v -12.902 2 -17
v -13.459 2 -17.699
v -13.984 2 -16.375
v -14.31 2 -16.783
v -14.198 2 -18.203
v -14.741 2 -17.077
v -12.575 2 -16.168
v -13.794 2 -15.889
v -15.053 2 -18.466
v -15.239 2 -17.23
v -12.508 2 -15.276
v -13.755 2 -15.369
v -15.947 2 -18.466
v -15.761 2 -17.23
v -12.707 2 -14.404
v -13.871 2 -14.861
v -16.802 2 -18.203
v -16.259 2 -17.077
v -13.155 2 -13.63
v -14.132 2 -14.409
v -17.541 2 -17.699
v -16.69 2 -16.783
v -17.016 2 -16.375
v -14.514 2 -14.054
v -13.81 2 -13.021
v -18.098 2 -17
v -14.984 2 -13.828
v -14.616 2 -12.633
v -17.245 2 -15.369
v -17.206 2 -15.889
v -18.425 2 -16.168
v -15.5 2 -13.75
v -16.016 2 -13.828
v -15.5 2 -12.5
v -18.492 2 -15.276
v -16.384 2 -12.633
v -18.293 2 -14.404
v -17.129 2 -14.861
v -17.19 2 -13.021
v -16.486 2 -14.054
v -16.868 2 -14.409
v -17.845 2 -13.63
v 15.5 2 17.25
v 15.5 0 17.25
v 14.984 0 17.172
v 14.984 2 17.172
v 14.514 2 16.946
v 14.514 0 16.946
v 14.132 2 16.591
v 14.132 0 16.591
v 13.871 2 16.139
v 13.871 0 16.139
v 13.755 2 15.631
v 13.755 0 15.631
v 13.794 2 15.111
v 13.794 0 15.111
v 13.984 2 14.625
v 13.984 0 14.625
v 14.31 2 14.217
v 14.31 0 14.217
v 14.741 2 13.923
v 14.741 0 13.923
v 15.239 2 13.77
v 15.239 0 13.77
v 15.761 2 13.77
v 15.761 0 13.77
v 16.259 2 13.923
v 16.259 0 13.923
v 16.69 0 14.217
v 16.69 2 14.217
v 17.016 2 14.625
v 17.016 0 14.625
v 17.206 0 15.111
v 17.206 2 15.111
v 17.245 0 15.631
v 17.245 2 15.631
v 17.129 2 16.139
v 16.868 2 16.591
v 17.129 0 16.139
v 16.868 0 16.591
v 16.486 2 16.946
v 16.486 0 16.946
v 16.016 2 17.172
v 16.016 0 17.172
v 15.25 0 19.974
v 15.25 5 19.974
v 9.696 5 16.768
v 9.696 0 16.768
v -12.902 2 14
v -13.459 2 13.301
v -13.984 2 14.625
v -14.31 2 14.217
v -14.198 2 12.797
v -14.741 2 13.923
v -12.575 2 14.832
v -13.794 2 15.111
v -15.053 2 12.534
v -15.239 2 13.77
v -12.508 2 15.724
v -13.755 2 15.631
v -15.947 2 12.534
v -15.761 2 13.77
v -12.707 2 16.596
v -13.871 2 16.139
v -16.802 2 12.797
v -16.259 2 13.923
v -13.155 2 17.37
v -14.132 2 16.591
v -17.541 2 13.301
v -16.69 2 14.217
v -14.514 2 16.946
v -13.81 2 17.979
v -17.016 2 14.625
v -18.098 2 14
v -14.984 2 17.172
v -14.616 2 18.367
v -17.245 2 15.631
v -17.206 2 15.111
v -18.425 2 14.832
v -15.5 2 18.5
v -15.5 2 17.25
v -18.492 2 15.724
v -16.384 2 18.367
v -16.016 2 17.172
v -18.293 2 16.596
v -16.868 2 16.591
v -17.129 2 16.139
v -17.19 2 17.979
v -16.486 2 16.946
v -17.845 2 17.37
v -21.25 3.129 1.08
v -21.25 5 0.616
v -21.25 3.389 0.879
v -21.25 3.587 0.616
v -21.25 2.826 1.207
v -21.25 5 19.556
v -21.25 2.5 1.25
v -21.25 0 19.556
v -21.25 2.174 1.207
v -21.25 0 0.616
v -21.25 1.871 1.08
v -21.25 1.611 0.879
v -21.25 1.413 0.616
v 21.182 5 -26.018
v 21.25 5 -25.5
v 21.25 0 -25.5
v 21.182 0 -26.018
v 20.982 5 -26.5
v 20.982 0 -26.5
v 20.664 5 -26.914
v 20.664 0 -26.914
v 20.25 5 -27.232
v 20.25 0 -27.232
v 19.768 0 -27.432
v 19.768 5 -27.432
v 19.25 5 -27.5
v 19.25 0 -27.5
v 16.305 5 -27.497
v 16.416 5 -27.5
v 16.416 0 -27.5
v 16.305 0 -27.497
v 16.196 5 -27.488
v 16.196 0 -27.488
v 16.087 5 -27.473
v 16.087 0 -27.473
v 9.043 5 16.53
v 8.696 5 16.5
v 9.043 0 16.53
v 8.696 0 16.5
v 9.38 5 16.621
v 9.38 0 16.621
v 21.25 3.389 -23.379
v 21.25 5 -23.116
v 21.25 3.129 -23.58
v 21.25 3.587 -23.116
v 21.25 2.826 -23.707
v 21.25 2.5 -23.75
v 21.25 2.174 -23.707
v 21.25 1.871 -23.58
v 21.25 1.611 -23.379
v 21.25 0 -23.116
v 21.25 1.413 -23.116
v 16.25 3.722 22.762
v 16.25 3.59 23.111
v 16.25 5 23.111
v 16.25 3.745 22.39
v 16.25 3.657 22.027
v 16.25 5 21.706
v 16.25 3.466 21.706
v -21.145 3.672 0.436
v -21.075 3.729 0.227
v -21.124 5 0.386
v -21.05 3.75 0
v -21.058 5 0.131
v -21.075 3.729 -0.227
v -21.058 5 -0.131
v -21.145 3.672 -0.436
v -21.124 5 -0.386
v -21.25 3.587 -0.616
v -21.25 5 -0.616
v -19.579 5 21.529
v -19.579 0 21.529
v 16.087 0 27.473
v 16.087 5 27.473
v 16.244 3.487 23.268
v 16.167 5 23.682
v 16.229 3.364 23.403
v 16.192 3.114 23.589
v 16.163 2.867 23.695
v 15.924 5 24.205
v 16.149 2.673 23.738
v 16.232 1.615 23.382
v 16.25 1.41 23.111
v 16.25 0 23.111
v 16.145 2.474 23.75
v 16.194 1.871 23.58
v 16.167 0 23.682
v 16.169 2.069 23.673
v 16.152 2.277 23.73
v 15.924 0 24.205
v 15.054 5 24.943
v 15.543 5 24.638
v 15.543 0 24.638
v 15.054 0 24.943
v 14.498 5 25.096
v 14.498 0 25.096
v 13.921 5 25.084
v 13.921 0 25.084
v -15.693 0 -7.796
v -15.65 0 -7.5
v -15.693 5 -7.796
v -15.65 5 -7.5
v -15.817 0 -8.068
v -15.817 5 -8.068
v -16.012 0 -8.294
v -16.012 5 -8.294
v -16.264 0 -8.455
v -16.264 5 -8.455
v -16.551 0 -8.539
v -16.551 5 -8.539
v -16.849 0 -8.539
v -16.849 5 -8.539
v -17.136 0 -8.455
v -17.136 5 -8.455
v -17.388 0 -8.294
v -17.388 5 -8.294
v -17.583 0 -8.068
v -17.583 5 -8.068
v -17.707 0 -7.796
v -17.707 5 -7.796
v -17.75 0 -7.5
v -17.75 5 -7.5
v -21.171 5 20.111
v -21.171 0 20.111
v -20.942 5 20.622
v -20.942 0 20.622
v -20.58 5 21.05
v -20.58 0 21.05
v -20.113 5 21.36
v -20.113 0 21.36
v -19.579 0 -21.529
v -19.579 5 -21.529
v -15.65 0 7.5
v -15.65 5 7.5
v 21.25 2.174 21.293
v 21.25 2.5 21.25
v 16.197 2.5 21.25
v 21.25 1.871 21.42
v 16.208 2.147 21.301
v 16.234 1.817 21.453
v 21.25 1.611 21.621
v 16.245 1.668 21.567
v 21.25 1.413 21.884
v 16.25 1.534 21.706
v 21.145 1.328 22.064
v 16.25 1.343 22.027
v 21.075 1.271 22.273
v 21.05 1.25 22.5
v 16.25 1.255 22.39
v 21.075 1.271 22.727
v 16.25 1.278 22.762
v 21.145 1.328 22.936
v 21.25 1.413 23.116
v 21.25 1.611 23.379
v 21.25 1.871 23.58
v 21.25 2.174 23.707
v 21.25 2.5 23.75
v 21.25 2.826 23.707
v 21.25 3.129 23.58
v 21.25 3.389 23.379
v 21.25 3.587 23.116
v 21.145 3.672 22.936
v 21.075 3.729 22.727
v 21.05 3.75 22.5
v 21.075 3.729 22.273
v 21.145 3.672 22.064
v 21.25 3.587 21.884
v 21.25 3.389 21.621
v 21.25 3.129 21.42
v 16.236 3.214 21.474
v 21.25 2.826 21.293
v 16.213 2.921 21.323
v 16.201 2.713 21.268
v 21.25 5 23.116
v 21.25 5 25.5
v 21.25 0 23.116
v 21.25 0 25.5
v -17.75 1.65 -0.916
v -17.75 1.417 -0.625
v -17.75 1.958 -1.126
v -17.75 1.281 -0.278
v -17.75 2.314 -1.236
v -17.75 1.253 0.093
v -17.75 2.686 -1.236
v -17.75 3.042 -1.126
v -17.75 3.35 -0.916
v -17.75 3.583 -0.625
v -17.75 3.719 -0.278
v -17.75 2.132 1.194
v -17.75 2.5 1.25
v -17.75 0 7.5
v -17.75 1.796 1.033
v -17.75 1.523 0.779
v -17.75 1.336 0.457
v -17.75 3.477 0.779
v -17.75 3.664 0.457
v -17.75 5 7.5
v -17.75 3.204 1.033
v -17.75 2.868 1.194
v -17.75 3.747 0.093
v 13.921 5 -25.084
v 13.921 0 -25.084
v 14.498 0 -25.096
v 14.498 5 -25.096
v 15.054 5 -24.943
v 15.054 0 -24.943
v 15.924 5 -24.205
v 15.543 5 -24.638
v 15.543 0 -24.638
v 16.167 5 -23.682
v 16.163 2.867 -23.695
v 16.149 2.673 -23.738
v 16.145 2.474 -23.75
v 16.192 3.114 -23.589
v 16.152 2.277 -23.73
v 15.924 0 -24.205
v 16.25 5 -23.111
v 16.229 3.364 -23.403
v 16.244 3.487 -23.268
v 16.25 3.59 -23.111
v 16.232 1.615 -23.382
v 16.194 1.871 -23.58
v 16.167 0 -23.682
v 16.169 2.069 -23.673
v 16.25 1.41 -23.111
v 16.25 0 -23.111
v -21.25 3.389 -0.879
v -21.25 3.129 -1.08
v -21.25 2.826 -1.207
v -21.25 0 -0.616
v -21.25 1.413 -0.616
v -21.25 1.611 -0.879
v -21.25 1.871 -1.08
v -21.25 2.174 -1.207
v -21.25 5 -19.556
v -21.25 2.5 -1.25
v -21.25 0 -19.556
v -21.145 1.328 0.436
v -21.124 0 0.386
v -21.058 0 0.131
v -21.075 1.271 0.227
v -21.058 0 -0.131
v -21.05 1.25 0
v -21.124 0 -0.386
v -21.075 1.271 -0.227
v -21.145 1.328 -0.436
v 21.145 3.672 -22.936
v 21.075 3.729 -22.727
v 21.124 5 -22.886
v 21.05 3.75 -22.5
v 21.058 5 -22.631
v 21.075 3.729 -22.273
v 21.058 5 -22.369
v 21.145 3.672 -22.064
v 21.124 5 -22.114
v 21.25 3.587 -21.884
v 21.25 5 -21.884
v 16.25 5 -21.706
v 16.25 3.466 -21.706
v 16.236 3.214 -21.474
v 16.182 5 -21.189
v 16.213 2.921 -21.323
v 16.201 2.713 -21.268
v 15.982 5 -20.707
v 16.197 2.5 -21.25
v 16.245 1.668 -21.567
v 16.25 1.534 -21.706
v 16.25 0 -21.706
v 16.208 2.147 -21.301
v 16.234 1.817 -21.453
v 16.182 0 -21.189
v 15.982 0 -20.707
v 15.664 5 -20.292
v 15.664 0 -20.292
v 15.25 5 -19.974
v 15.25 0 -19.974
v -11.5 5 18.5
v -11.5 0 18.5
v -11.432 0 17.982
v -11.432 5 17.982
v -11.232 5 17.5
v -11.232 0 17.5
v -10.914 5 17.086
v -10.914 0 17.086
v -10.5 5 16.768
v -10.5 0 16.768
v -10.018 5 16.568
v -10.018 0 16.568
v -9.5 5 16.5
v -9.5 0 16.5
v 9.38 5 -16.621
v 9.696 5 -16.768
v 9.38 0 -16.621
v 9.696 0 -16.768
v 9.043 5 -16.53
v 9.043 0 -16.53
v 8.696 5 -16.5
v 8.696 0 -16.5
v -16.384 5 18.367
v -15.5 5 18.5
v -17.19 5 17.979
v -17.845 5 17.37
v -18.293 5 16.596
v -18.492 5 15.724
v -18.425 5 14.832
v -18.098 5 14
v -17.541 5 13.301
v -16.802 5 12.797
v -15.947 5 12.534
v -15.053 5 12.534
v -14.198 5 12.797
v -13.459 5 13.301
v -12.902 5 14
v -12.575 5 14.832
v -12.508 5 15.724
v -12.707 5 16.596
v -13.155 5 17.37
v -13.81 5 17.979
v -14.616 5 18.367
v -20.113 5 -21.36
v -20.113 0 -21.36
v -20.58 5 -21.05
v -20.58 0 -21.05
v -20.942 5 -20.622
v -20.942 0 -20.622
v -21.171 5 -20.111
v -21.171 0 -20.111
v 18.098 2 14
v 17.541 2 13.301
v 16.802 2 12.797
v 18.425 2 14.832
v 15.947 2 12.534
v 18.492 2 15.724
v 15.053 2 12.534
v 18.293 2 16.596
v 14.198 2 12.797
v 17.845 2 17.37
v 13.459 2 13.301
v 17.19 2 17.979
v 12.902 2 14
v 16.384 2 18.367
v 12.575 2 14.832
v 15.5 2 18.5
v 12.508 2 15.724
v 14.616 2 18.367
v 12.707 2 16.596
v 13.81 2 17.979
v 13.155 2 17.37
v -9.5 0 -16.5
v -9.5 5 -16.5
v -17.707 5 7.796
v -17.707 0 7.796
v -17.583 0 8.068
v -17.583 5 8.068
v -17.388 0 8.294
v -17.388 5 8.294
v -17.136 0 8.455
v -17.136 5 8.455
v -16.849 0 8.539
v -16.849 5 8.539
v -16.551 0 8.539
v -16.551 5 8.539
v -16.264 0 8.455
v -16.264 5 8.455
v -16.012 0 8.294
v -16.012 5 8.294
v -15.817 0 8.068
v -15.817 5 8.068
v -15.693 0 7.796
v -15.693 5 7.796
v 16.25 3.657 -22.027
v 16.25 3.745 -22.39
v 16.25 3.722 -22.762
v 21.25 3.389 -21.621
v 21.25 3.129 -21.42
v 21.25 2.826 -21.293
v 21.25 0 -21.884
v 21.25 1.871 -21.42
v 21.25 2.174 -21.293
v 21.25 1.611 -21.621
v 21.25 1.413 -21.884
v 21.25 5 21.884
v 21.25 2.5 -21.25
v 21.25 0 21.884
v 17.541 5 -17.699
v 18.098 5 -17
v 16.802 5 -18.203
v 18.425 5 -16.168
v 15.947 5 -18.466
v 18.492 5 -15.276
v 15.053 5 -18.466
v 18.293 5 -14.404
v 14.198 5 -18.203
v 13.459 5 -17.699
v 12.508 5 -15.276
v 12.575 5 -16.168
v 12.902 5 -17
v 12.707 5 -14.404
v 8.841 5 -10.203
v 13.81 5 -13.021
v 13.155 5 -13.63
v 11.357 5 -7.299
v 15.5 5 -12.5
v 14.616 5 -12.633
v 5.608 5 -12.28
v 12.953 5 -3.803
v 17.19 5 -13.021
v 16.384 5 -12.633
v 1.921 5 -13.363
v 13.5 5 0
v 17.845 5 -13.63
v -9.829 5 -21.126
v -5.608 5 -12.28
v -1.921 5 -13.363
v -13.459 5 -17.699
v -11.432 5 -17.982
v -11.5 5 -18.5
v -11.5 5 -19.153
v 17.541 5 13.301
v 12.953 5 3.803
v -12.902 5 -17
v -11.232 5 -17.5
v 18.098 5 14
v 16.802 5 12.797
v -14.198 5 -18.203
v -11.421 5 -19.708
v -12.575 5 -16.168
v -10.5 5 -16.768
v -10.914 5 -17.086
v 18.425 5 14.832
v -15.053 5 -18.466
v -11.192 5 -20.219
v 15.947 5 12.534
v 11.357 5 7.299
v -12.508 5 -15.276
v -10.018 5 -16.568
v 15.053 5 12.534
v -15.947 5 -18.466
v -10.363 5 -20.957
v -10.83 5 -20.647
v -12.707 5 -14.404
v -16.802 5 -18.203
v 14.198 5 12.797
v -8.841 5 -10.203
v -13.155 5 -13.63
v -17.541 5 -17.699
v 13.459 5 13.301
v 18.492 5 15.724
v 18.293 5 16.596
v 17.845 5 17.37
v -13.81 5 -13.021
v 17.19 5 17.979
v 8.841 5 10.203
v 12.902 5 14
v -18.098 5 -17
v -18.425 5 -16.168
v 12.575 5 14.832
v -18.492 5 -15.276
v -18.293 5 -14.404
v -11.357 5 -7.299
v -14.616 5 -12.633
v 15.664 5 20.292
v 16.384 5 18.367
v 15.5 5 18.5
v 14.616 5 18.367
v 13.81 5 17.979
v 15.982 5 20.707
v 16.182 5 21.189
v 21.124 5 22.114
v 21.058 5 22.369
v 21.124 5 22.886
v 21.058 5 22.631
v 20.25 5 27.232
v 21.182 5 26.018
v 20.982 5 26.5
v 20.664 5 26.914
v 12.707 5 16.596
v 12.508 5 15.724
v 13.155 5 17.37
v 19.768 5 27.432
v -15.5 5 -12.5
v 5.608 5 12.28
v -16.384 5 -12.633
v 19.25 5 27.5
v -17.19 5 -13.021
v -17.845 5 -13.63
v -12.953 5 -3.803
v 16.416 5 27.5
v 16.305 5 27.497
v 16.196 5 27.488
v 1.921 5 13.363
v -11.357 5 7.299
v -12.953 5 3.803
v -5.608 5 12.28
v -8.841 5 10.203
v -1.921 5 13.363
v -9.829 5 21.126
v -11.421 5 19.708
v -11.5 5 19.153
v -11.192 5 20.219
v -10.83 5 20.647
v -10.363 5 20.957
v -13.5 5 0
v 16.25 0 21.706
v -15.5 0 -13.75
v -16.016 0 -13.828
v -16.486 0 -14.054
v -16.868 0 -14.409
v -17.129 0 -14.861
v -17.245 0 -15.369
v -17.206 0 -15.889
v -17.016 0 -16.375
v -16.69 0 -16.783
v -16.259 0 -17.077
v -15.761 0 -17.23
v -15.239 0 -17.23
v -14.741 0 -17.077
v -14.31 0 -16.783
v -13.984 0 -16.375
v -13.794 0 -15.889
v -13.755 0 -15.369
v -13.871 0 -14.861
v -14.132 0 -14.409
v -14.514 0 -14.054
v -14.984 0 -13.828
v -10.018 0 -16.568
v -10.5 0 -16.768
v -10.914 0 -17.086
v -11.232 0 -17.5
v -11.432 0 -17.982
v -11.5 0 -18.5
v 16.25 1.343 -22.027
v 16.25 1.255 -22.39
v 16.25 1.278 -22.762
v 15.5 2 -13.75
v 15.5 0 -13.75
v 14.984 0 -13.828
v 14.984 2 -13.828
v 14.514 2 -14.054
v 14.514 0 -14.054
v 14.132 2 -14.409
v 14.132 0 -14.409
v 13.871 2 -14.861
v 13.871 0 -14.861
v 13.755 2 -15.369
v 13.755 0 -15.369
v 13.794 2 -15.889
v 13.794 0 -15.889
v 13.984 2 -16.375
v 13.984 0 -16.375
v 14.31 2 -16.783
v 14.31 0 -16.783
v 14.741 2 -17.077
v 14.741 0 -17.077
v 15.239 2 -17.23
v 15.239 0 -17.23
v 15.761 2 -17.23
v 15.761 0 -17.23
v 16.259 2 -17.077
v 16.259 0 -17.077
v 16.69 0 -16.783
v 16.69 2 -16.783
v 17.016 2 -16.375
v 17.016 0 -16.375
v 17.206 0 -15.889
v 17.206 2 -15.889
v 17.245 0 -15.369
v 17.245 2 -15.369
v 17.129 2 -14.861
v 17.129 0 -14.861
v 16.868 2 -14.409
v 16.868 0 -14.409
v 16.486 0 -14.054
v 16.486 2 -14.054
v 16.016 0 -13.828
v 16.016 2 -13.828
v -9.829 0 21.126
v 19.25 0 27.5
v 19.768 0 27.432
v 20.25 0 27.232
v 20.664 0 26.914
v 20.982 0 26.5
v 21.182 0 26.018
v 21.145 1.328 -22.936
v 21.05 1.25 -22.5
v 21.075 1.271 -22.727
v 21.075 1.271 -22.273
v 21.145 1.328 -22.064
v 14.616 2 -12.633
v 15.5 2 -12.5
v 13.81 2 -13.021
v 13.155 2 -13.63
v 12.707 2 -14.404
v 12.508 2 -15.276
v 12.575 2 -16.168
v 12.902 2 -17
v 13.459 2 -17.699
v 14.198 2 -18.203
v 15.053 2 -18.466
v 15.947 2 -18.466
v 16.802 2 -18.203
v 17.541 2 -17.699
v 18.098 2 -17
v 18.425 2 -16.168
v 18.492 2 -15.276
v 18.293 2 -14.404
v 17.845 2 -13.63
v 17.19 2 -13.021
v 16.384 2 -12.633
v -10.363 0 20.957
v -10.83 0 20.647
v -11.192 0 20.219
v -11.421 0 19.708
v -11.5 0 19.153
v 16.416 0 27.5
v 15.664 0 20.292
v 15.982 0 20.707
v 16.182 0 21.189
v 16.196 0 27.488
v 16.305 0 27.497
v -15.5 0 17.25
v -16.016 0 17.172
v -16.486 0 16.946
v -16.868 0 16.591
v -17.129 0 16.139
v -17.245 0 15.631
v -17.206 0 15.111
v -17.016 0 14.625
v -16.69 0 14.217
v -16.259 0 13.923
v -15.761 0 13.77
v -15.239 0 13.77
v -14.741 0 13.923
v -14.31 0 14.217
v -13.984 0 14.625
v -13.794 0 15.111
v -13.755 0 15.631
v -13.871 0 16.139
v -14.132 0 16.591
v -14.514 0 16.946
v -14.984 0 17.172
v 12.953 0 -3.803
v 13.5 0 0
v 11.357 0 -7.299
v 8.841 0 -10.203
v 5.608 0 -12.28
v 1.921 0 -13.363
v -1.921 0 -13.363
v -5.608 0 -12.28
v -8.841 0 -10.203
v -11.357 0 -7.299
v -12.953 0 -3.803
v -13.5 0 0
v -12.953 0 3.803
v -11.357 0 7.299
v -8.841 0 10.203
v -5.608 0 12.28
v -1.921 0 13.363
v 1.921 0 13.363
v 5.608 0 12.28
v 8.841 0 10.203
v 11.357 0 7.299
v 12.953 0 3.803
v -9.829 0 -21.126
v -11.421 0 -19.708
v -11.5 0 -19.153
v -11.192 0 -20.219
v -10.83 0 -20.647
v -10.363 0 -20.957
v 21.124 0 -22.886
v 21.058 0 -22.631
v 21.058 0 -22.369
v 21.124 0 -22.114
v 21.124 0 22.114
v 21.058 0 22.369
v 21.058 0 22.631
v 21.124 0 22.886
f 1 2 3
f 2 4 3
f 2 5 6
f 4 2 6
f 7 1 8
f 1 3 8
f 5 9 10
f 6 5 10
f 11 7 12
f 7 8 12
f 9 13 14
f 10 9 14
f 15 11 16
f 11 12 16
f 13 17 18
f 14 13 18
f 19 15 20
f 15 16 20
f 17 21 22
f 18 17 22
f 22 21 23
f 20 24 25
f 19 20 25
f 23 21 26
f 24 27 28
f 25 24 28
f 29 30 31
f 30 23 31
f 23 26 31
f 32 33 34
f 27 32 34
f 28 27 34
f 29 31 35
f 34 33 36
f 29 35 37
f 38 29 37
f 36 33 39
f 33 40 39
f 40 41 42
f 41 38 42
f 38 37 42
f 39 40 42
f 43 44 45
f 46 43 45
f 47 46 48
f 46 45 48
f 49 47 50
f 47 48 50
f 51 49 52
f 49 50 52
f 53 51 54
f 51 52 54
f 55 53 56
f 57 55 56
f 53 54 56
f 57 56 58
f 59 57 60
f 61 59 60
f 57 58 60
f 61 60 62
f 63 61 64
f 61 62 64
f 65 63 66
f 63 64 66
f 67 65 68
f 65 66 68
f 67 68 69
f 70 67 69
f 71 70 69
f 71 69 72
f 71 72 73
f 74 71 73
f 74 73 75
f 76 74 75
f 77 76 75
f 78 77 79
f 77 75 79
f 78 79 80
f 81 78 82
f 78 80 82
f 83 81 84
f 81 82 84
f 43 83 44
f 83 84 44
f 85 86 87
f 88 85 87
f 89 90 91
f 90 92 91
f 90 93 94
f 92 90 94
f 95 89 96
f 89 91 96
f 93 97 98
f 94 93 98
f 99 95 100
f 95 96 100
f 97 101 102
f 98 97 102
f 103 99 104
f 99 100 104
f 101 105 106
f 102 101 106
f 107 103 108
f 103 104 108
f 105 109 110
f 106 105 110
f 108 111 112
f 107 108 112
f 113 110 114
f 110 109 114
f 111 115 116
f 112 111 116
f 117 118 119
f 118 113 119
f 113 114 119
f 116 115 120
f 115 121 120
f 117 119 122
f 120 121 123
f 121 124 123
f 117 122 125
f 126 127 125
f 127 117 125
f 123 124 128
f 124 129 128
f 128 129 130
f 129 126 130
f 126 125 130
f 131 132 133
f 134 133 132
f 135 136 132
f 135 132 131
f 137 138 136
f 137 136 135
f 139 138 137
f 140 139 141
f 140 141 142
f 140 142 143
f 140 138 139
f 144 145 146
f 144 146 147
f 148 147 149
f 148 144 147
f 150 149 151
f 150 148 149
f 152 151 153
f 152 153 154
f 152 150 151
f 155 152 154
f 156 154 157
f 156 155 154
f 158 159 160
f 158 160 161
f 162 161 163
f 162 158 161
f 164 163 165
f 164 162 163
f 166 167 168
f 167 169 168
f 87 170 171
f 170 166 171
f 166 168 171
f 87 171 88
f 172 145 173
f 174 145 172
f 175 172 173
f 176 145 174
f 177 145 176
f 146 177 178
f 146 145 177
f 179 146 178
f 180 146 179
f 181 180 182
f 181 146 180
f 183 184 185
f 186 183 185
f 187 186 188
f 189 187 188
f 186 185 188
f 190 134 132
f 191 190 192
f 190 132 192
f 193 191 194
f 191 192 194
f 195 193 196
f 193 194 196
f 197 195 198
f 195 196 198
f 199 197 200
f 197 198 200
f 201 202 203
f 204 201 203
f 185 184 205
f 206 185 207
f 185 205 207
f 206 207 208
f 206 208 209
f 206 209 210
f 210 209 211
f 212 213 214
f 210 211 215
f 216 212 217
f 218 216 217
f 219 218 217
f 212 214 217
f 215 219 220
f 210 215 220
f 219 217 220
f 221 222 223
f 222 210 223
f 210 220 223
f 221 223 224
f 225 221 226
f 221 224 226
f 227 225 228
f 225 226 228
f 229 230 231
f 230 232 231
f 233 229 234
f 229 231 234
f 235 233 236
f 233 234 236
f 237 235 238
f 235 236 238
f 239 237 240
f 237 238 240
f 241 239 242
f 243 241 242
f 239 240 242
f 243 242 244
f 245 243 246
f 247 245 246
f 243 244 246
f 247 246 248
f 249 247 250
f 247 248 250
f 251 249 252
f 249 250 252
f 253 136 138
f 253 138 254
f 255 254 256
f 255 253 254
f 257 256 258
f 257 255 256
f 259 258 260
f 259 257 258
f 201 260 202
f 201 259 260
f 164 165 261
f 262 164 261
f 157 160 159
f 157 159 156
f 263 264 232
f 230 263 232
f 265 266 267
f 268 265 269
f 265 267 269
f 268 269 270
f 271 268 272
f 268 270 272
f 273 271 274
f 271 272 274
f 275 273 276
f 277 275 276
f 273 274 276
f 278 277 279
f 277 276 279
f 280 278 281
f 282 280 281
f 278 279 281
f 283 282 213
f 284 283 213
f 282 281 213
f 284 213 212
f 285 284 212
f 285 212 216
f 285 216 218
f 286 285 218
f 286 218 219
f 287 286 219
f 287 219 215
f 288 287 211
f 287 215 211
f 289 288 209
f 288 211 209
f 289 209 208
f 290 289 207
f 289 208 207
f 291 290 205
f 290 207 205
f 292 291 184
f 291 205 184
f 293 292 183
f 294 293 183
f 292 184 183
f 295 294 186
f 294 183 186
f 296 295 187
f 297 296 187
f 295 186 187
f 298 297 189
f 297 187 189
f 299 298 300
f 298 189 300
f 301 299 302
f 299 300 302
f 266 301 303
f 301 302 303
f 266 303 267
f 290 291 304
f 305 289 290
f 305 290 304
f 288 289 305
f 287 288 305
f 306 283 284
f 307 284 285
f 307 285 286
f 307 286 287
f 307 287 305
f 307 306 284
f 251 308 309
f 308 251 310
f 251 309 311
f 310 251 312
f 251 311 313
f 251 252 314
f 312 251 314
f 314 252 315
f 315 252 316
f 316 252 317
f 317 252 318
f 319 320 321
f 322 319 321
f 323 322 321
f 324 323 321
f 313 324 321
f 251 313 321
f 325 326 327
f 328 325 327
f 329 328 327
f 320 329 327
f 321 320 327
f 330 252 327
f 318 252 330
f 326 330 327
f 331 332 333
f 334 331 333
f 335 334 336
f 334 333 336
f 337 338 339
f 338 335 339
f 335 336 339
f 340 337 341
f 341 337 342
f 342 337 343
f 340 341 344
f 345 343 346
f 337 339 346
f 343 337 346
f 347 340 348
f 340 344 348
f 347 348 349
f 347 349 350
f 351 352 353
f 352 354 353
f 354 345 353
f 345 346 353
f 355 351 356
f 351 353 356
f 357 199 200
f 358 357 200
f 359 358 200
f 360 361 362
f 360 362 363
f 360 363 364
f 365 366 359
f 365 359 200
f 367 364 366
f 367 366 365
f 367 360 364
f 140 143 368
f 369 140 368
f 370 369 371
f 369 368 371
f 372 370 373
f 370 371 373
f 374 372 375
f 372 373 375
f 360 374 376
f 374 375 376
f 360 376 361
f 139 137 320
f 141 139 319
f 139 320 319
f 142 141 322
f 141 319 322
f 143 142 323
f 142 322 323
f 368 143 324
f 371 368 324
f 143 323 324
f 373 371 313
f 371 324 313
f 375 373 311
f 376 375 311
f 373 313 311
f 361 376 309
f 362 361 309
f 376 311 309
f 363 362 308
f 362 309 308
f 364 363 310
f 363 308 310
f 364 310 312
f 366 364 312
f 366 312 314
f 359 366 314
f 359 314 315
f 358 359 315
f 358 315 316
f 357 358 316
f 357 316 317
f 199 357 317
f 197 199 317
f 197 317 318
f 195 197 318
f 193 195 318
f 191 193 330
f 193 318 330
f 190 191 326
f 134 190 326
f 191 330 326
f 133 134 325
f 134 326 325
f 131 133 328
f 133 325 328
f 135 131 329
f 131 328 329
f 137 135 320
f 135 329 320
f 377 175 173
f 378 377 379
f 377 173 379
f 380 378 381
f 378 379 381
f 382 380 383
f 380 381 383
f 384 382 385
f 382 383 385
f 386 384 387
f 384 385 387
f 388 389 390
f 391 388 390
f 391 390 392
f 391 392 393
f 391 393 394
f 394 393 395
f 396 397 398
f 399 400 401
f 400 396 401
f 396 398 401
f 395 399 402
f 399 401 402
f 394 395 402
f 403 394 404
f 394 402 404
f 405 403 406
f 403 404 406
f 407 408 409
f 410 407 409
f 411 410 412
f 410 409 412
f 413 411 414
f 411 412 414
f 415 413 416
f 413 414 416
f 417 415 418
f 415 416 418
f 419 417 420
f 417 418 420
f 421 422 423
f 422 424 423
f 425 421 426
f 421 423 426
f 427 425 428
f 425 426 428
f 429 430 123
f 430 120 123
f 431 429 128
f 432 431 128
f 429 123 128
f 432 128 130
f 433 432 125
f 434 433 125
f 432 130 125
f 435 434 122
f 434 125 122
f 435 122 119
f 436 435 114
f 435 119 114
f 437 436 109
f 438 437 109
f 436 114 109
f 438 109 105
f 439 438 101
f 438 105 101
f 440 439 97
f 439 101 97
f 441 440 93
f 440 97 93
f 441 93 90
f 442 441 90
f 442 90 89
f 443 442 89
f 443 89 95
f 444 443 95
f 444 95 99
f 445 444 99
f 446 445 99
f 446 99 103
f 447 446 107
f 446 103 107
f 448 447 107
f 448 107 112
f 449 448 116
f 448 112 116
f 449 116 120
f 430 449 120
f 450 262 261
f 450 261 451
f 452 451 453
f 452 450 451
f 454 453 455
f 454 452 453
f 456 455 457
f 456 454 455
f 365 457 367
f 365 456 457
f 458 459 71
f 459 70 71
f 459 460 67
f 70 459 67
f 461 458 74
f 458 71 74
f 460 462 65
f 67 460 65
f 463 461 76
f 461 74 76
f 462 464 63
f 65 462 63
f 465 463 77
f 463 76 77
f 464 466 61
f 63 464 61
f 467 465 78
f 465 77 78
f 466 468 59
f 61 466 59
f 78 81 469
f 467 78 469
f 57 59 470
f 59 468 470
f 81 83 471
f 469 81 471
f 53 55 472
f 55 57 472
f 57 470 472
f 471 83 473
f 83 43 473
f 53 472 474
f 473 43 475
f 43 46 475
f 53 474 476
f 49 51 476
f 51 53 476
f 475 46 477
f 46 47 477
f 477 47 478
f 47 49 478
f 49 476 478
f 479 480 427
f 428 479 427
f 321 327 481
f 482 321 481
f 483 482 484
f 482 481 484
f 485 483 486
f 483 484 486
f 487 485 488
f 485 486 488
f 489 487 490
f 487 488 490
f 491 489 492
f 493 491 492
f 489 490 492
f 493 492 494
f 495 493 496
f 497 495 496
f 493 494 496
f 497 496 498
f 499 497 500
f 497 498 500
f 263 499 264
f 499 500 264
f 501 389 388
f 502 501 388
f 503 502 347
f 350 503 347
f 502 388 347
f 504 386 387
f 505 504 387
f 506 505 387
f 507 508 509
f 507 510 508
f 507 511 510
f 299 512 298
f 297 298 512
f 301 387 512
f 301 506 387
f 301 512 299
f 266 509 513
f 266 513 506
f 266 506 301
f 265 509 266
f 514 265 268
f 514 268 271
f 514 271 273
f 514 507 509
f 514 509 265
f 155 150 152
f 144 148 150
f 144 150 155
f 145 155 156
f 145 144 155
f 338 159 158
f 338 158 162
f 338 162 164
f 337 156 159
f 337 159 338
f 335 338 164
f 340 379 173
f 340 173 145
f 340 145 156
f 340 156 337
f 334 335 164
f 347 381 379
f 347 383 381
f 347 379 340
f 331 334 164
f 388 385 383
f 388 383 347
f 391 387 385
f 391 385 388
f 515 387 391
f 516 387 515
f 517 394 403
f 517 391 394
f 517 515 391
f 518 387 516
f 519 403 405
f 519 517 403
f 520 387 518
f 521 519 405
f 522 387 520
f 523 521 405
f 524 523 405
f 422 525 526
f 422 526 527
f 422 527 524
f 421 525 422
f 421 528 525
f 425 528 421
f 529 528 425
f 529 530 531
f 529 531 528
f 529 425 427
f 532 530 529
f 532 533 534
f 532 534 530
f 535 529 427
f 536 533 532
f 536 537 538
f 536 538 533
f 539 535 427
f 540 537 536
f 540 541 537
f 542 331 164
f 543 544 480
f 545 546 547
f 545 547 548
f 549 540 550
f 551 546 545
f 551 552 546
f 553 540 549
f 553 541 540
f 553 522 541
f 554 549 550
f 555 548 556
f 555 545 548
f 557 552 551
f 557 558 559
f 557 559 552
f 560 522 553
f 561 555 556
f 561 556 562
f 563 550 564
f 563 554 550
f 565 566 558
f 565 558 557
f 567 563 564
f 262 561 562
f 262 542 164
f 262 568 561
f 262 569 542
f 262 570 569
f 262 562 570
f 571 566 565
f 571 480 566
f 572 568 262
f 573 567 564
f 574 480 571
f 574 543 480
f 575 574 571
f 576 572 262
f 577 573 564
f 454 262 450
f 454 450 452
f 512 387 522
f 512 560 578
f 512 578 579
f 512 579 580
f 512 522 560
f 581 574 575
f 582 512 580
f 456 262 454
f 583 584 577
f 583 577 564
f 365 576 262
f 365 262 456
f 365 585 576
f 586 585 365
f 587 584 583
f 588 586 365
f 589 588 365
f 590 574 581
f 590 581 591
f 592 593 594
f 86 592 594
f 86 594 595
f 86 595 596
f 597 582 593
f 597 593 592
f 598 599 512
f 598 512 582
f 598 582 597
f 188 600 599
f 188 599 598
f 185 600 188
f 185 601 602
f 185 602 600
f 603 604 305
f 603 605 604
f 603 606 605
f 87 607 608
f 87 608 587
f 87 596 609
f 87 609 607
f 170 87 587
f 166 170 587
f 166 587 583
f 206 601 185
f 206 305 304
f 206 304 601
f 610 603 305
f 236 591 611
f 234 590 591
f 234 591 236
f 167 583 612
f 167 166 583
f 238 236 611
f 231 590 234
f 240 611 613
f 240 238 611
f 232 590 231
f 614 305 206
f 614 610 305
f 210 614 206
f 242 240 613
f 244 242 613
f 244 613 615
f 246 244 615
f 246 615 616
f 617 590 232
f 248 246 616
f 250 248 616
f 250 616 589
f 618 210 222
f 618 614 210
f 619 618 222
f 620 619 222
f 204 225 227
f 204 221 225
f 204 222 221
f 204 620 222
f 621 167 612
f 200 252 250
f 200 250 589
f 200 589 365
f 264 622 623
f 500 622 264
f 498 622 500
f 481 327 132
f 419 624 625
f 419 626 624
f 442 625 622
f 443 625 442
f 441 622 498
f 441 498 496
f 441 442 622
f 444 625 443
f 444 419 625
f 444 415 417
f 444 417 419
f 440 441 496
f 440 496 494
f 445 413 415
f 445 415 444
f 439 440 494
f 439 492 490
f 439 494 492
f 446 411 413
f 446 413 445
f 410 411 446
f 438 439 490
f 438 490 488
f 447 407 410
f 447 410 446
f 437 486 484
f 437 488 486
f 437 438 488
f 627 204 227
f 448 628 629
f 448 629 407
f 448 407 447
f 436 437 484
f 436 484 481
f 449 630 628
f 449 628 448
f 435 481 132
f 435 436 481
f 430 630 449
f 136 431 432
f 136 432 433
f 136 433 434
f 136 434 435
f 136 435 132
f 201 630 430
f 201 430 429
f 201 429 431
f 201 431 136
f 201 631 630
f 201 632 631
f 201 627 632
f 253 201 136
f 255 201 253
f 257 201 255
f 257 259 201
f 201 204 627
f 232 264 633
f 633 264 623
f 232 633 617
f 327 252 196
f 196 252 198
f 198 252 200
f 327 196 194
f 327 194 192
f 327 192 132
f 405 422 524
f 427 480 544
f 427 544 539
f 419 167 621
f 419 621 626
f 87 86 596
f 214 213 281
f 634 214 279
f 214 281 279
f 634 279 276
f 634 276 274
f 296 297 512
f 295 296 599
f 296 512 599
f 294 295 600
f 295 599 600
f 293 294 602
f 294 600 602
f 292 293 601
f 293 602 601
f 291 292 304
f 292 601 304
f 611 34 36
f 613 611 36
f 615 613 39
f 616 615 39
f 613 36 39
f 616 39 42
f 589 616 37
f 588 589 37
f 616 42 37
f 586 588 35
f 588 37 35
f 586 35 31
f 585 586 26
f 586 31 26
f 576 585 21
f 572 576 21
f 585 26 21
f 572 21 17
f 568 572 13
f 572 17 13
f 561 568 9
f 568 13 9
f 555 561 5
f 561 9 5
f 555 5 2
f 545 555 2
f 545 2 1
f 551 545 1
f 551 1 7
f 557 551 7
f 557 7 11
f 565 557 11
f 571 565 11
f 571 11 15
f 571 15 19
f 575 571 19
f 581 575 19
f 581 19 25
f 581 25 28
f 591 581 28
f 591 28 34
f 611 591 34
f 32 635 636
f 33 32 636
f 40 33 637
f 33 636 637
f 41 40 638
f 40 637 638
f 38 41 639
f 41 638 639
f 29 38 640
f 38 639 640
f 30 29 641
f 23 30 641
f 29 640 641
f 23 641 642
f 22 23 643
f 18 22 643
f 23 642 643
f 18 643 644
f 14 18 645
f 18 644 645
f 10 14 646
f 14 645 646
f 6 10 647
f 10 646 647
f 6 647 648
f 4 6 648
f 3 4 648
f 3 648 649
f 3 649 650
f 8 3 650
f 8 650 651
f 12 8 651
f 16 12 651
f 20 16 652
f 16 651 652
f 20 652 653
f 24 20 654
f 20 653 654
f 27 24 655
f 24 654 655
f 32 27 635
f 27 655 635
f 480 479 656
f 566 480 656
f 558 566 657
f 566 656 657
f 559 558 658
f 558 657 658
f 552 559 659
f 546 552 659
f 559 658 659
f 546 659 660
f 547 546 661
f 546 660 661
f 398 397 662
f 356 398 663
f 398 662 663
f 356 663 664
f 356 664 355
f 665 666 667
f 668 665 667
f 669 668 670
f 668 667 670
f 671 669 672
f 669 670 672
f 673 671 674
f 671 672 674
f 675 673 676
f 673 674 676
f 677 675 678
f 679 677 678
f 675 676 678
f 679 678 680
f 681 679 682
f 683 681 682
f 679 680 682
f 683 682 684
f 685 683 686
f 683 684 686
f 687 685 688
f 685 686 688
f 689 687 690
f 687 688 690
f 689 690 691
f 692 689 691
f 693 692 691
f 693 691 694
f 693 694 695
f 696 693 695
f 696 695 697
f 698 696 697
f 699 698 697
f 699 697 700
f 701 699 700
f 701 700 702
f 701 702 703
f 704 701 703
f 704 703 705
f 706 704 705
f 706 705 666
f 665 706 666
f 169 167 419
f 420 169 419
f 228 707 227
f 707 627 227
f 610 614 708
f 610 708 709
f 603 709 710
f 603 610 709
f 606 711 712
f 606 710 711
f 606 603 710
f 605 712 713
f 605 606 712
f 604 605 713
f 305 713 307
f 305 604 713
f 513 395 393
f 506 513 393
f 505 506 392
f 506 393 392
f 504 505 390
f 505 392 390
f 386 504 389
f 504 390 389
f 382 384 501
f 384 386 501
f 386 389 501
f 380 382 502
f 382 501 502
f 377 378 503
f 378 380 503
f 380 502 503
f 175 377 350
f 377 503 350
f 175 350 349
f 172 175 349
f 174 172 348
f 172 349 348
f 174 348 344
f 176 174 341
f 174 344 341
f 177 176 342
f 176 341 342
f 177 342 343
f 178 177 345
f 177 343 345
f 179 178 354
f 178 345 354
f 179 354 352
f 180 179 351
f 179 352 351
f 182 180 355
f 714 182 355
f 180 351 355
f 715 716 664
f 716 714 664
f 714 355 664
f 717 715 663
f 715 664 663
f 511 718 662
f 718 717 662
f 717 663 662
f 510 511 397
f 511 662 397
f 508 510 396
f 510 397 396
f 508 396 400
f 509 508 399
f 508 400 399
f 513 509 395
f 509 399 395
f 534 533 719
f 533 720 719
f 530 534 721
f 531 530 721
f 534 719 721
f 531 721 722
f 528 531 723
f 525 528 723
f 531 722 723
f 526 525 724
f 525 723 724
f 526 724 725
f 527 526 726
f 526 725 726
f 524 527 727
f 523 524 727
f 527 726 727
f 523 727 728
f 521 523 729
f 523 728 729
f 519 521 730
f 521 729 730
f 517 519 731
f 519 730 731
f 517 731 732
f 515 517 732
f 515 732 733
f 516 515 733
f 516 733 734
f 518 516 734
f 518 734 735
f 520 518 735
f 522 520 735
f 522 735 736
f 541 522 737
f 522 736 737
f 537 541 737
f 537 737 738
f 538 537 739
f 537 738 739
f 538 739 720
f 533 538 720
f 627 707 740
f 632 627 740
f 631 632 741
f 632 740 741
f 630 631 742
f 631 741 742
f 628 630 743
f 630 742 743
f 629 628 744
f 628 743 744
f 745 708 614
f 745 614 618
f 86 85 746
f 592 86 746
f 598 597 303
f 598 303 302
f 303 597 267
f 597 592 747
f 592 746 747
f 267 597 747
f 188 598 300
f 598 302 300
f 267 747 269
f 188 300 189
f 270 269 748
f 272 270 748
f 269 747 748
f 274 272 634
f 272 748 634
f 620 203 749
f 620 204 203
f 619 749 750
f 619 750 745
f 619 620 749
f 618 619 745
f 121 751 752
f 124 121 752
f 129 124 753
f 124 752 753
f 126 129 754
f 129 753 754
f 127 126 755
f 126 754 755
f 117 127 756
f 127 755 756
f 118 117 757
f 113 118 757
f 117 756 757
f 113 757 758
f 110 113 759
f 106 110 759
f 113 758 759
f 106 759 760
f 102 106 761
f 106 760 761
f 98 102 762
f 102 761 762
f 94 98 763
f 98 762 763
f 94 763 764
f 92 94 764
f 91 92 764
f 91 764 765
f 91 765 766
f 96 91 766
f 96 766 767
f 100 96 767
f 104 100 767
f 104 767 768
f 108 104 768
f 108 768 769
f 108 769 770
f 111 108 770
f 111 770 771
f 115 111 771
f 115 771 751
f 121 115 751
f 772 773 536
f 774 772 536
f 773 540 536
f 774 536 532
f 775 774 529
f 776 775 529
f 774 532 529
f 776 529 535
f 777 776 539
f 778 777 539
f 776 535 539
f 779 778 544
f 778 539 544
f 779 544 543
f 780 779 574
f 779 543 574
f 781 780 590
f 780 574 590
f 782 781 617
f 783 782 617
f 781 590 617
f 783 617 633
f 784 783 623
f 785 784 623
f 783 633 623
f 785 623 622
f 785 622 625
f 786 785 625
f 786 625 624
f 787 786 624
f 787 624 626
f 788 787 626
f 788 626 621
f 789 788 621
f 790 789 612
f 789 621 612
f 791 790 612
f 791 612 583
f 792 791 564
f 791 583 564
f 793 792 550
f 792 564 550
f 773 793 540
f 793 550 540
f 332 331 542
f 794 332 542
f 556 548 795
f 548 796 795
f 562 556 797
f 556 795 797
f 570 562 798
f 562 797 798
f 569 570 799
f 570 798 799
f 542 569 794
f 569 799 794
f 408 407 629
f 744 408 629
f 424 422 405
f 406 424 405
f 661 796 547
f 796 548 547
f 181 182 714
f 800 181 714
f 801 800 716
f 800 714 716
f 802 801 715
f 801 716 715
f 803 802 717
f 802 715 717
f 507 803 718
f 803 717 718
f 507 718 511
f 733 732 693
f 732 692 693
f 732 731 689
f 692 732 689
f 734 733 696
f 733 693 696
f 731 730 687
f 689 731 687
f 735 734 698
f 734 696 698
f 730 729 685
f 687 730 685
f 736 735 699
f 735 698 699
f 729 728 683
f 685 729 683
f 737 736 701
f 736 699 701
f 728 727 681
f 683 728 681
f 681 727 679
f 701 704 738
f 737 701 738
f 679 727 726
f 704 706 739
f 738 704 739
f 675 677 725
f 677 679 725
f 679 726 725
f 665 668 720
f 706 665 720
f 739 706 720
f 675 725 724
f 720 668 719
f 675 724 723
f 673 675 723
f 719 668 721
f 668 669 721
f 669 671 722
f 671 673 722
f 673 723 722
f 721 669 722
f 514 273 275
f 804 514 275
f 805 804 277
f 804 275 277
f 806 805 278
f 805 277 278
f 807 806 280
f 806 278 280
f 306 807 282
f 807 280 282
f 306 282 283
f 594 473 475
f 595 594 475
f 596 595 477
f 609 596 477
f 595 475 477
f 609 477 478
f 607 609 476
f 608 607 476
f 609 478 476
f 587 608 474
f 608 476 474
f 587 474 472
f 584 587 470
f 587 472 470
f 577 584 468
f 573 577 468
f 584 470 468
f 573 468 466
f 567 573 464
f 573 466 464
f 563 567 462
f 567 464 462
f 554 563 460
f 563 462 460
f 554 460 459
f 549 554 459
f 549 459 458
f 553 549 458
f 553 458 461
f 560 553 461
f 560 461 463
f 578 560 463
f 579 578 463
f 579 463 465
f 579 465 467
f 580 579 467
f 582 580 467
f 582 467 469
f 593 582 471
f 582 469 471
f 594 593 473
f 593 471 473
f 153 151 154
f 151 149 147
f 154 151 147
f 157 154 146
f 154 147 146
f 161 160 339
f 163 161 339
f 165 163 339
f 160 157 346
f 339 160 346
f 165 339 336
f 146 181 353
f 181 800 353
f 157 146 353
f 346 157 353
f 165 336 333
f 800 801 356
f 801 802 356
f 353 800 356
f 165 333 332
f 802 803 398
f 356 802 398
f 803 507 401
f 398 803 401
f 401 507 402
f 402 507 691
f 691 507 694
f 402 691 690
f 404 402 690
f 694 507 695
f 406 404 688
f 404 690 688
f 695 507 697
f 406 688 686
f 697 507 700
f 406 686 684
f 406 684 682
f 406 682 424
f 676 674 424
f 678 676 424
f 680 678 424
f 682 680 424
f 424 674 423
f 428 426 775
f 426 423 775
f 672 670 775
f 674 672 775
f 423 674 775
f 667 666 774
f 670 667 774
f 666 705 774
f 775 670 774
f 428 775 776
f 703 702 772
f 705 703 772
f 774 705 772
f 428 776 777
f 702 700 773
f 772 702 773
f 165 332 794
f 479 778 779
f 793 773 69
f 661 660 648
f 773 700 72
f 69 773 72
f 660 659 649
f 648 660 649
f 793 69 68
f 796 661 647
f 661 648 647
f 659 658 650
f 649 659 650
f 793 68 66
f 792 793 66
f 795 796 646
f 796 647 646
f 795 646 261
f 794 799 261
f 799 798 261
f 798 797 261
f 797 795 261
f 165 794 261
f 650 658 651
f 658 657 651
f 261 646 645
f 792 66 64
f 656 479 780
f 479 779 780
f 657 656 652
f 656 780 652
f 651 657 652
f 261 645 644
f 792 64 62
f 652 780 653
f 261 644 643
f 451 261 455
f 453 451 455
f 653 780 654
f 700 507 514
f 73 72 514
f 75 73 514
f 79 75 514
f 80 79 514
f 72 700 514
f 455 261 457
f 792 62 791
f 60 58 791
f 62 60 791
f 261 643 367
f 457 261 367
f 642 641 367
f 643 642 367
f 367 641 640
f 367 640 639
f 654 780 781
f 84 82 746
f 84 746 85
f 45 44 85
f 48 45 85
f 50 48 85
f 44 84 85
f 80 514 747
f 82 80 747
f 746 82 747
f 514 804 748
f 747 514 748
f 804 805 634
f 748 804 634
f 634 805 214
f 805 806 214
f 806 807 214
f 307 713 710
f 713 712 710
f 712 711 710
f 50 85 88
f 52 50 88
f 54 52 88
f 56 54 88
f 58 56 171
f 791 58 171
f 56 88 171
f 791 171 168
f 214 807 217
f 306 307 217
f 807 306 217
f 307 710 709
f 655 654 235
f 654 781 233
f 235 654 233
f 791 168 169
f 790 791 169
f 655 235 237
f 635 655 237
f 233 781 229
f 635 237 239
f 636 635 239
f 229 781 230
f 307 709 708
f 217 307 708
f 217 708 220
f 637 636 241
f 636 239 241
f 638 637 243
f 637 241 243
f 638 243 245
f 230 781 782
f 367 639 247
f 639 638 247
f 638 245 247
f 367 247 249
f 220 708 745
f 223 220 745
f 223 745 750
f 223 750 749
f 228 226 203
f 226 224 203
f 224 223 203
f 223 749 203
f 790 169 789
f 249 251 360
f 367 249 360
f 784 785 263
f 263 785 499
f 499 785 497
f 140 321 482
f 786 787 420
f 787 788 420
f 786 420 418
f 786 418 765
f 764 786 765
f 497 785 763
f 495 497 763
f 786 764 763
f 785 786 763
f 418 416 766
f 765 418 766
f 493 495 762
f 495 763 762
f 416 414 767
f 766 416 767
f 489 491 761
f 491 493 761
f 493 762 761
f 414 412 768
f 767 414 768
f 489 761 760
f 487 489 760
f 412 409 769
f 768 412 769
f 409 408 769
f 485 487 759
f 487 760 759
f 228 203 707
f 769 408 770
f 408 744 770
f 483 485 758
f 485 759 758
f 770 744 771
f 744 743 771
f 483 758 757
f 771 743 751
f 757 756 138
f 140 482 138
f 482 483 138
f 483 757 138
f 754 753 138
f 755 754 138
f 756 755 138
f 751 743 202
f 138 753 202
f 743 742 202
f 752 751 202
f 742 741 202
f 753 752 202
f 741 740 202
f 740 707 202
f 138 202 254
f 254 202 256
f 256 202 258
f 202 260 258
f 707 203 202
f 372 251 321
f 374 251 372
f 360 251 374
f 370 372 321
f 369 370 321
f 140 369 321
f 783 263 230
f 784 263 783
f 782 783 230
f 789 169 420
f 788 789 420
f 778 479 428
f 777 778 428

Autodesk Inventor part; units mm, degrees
ref_plane "YZ Plane" through (0, 0, 0) normal (1, 0, 0) x (0, 1, 0)
ref_plane "XZ Plane" through (0, 0, 0) normal (0, 1, 0) x (-1, 0, 0)
ref_plane "XY Plane" through (0, 0, 0) normal (0, 0, 1) x (1, 0, 0)
sketch "スケッチ1" plane through (0, 0, 0) normal (0, 1, 0) x (-1, 0, 0)
  line L0 (-21.25, 21.25) -> (21.25, 21.25)
  line L1 (21.25, 21.25) -> (21.25, -21.25)
  line L2 (21.25, -21.25) -> (-21.25, -21.25)
  line L3 (-21.25, -21.25) -> (-21.25, 21.25)
  line L4 (-21.25, 21.25) -> (21.25, -21.25) construction
  line L5 (21.25, 21.25) -> (-21.25, -21.25) construction
  line L6 (-21.25, 27.5) -> (-16.25, 27.5)
  line L7 (-16.25, 27.5) -> (-16.25, -27.5)
  line L8 (-16.25, -27.5) -> (-21.25, -27.5)
  line L9 (-21.25, -27.5) -> (-21.25, 27.5)
  line L10 (-21.25, 27.5) -> (-16.25, -27.5) construction
  line L11 (-16.25, 27.5) -> (-21.25, -27.5) construction
  line L12 (21.25, 21.25) -> (-16.25, 27.5)
  line L13 (-16.25, -27.5) -> (21.25, -21.25)
  point P0 (0, 0)
  point P1 (-18.75, 0)
  dimension "d0" = 42.5
  dimension "d1" = 42.5
  dimension "d12" = 6.25
  dimension "d13" = 5
extrude "プレート1" add sketch "スケッチ1" along normal blind 5
sketch "スケッチ2" plane through (0, 5, 0) normal (0, 1, 0) x (1, 0, 0)
  line L0 (15.5, -15.5) -> (-15.5, -15.5) construction
  line L1 (-15.5, -15.5) -> (-15.5, 15.5) construction
  line L2 (-15.5, 15.5) -> (15.5, 15.5) construction
  line L3 (15.5, 15.5) -> (15.5, -15.5) construction
  line L4 (15.5, -15.5) -> (-15.5, 15.5) construction
  line L5 (-15.5, -15.5) -> (15.5, 15.5) construction
  point P0 (0, 0)
  dimension "d3" = 31
  dimension "d4" = 31
hole "穴1" at (15.5, 5, 15.5) at (15.5, 5, -15.5) at (-15.5, 5, -15.5) at (-15.5, 5, 15.5) direction (0, -1, 0) diameter 3.5 depth 5 tip angle 118 counterbore diameter 6 counterbore depth 3
sketch "スケッチ3" plane through (0, 5, 0) normal (0, 1, 0) x (1, 0, 0)
  line L0 (21.25, 27.5) -> (21.25, -27.5) projected
  circle A0 centre (22.1, -22.5) radius 1.05
  line L1 (21.25, -27.5) -> (16.25, -27.5) projected
  line L2 (16.25, -27.5) -> (-21.25, -21.25) projected
  line L3 (-11.5, -20.8474) -> (16.25, -25.4724)
  line L4 (16.25, -25.4724) -> (16.25, -20.5518)
  line L5 (16.25, -20.5518) -> (9.2321, -16.5)
  line L6 (9.2321, -16.5) -> (-11.5, -16.5)
  line L7 (-11.5, -16.5) -> (-11.5, -20.8474)
  line L8 (-21.25, -21.25) -> (-21.25, 21.25) projected
  circle A1 centre (15.5, -15.5) radius 1.75 projected
  circle A2 centre (-15.5, -15.5) radius 1.75 projected
  point P0 (0, 0)
  dimension "d14" = 2.1
  dimension "d15" = 0.85
  dimension "d16" = 5
  dimension "d19" = 2
  dimension "d20" = 5
  dimension "d21" = 4
  dimension "d22" = 1
  dimension "d23" = 4
  dimension "d24" = 120
extrude "押し出し1" cut sketch "スケッチ3" against normal through all contours A0 L0 | L0 A0 | L7 L6 L5 L4 L3
fillet "フィレット1" radius 2 5 edges at (16.25, 2.5, 25.4724) (16.25, 2.5, 20.5518) (9.2321, 2.5, 16.5) (-11.5, 2.5, 16.5) (-11.5, 2.5, 20.8474)
sketch "スケッチ4" plane through (21.25, 0, 27.5) normal (1, 0, 0) x (0, 0, -1)
  line L0 (4.3836, 0) -> (4.3836, 5) projected
  line L1 (5.6164, 0) -> (4.3836, 0) projected
  line L2 (5.6164, 5) -> (5.6164, 0) projected
  line L3 (4.3836, 5) -> (5.6164, 5) projected
  point P0 (27.5, 0)
  point P1 (5, 2.5)
  point P2 (5, 5)
  point P3 (4.3836, 2.5)
hole "穴2" at (21.25, 2.5, 22.5) direction (-1, 0, 0) diameter 2.5 depth 8 tip angle 118
mirror "ミラー1" about plane through (0, 0, 0) normal (0, 0, 1) of "押し出し1", "フィレット1", "穴2"
sketch "スケッチ5" plane through (0, 5, 0) normal (0, 1, 0) x (1, 0, 0)
  circle A0 centre (0, 0) radius 13.5
  dimension "d33" = 27
extrude "押し出し2" cut sketch "スケッチ5" against normal through all
fillet "フィレット2" radius 2 6 edges at (-21.25, 2.5, 21.25) (-21.25, 2.5, -21.25) (16.25, 2.5, -27.5) (21.25, 2.5, -27.5) (21.25, 2.5, 27.5) (16.25, 2.5, 27.5)
sketch "スケッチ6" plane through (0, 5, 0) normal (0, 1, 0) x (1, 0, 0)
  line L0 (-21.25, -19.5557) -> (-21.25, 19.5557) projected
  circle A0 centre (-22.1, 0) radius 1.05
  point P0 (0, 0)
  dimension "d37" = 2.1
  dimension "d38" = 0.85
extrude "押し出し3" cut sketch "スケッチ6" against normal through all
sketch "スケッチ7" plane through (0, 5, 0) normal (0, 1, 0) x (1, 0, 0)
  line L0 (-16.7, -7.5) -> (-16.7, 7.5) construction
  line L1 (-15.65, -7.5) -> (-15.65, 7.5)
  line L2 (-17.75, 7.5) -> (-17.75, -7.5)
  arc A0 (-17.75, -7.5) -> (-15.65, -7.5) centre (-16.7, -7.5) ccw
  arc A1 (-15.65, 7.5) -> (-17.75, 7.5) centre (-16.7, 7.5) ccw
  line L3 (-21.25, 0.6164) -> (-21.25, 19.5557) projected
  point P0 (0, 0)
  point P1 (-16.7, 0)
  dimension "d41" = 3.5
  dimension "d42" = 2.1
  dimension "d43" = 15
extrude "押し出し4" cut sketch "スケッチ7" against normal through all
sketch "スケッチ8" plane through (-21.25, 0, 19.5557) normal (-1, 0, 0) x (0, 0, 1)
  line L0 (-20.1722, 0) -> (-20.1722, 5) projected
  line L1 (-18.9393, 0) -> (-20.1722, 0) projected
  line L2 (-18.9393, 5) -> (-18.9393, 0) projected
  line L3 (-20.1722, 5) -> (-18.9393, 5) projected
  point P0 (-19.5557, 0)
  point P1 (-19.5557, 2.5)
  point P2 (-19.5557, 0)
  point P3 (-18.9393, 2.5)
hole "穴3" at (-21.25, 2.5, 0) direction (1, 0, 0) diameter 2.5 depth 4 tip angle 118
equation "\"d10\" = Thickness"
equation "\"d23\" = d21"
equation "\"d2\" = Thickness"
equation "\"BendRadius\" = Thickness"
equation "\"BendReliefWidth\" = Thickness"
equation "\"BendReliefDepth\" = 0.5 * Thickness"
equation "\"TransitionRadius\" = BendRadius"
equation "\"JacobiRadiusSize\" = BendRadius"
equation "\"GapSize\" = Thickness"
equation "\"Thickness\" = 5"
properties part number "T5.0_stepper-fix"
